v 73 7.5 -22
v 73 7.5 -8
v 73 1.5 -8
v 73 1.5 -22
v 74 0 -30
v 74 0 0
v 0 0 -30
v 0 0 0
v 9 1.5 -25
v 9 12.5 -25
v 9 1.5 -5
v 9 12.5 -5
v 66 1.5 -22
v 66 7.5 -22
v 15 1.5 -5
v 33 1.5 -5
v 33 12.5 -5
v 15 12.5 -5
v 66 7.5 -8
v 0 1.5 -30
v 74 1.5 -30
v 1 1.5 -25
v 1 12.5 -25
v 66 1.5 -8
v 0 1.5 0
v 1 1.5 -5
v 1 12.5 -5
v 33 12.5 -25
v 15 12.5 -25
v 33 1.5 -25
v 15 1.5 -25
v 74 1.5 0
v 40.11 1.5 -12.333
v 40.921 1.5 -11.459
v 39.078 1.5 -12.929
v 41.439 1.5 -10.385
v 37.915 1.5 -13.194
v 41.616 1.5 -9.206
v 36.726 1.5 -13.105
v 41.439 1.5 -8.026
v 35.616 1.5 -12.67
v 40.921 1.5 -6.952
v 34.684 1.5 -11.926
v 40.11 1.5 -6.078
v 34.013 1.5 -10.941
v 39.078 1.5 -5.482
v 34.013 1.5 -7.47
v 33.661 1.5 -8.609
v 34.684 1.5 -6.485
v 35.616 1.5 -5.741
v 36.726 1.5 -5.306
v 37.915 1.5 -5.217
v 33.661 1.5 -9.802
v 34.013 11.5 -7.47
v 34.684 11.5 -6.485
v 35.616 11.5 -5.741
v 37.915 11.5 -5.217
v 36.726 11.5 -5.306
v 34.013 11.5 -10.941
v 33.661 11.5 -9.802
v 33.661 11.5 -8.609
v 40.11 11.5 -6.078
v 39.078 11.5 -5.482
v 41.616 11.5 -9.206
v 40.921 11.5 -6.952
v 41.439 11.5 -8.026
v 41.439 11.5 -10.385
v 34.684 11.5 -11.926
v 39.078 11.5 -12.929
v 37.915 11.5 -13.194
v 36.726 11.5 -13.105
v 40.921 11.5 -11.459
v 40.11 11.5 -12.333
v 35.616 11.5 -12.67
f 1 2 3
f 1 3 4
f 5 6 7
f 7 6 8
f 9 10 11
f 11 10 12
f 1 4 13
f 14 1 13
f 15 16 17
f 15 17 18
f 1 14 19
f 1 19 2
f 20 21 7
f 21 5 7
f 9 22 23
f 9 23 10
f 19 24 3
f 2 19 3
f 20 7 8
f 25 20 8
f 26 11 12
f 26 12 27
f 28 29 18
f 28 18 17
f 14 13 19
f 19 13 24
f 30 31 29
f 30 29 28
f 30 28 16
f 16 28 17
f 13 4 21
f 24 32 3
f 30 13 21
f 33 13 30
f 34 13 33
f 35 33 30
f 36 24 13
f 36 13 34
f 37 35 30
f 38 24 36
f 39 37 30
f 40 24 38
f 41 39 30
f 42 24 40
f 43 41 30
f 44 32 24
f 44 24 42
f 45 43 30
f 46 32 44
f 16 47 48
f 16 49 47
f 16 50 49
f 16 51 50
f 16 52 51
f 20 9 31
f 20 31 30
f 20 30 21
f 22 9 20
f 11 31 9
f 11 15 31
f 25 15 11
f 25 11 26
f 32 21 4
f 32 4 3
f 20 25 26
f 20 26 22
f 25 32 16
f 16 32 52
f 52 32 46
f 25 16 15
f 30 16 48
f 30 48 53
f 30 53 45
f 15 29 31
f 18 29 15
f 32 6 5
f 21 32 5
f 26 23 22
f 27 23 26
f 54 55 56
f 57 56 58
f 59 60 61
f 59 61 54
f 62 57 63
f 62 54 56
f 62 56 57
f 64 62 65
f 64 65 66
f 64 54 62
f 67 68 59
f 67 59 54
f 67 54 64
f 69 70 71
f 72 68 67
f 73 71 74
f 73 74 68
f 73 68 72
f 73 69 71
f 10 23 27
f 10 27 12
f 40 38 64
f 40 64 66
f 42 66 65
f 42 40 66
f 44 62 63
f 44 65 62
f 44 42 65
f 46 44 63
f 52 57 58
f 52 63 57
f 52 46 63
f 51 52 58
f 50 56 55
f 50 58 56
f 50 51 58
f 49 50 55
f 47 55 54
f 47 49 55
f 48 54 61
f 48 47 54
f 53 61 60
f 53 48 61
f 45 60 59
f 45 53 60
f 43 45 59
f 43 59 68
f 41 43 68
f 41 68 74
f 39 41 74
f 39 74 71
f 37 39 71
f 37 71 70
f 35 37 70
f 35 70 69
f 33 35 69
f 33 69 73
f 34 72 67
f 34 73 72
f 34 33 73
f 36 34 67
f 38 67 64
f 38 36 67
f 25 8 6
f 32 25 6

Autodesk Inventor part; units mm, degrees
ref_plane "YZ Plane" through (0, 0, 0) normal (1, 0, 0) x (0, 1, 0)
ref_plane "XZ Plane" through (0, 0, 0) normal (0, 1, 0) x (-1, 0, 0)
ref_plane "XY Plane" through (0, 0, 0) normal (0, 0, 1) x (1, 0, 0)
sketch "Sketch1" plane through (0, 0, 0) normal (0, 1, 0) x (-1, 0, 0)
  line L0 (0, 0) -> (-74, 0)
  line L1 (-74, 0) -> (-74, -30)
  line L2 (-74, -30) -> (0, -30)
  line L3 (0, -30) -> (0, 0)
  dimension "d0" = 74
  dimension "d1" = 30
extrude "Extrusion1" add sketch "Sketch1" along normal blind 1.5
sketch "Sketch2" plane through (0, 1.5, 0) normal (0, 1, 0) x (1, 0, 0)
  line L0 (0, 0) -> (74, 0) construction
  line L1 (0, 0) -> (0, 5) construction
  line L2 (0, 30) -> (0, 0) construction
  line L3 (0, 30) -> (0, 25) construction
  line L4 (0, 25) -> (42, 25)
  line L5 (42, 25) -> (42, 5)
  line L6 (42, 5) -> (0, 5)
  line L7 (0, 5) -> (0, 25)
  dimension "d4" = 5
  dimension "d5" = 5
  dimension "d6" = 42
extrude "Extrusion2" add sketch "Sketch2" along normal blind 11
sketch "Sketch3" plane through (0, 1.5, 0) normal (0, 1, 0) x (1, 0, 0)
  line L0 (74, 30) -> (0, 30) construction
  line L1 (74, 30) -> (74, 22) construction
  line L2 (74, 0) -> (74, 30) construction
  line L3 (0, 0) -> (74, 0) construction
  line L4 (74, 0) -> (74, 8) construction
  line L5 (74, 22) -> (66, 22)
  line L6 (66, 22) -> (66, 8)
  line L7 (66, 8) -> (74, 8)
  line L8 (74, 8) -> (74, 22)
  dimension "d9" = 8
  dimension "d10" = 8
  dimension "d11" = 8
extrude "Extrusion3" add sketch "Sketch3" along normal blind 6
sketch "Sketch4" plane through (0, 12.5, 0) normal (0, 1, 0) x (1, 0, 0)
  line L0 (0, 25) -> (42, 25) projected
  line L1 (42, 5) -> (0, 5) projected
  line L2 (0, 25) -> (9, 25)
  line L3 (9, 25) -> (9, 5)
  line L4 (9, 5) -> (0, 5)
  line L5 (0, 5) -> (0, 25)
  line L6 (0, 25) -> (32, 25)
  line L7 (32, 25) -> (32, 5)
  line L8 (32, 5) -> (0, 5)
  line L9 (0, 5) -> (0, 25)
  line L10 (32, 25) -> (15, 25)
  line L11 (15, 25) -> (15, 5)
  line L12 (15, 5) -> (32, 5)
  line L13 (32, 5) -> (32, 25)
  point P0 (0, 0)
  dimension "d14" = 9
  dimension "d15" = 32
  dimension "d16" = 17
extrude "Extrusion4" cut sketch "Sketch4" against normal up to surface (11 mm away) contours L0 L11 L1 L3
sketch "Sketch5" plane through (0, 12.5, 0) normal (0, 1, 0) x (1, 0, 0)
  line L0 (15, 5) -> (42, 5) projected
  line L1 (15, 25) -> (33, 25)
  line L2 (33, 25) -> (33, 5)
  line L3 (33, 5) -> (15, 5)
  line L4 (15, 5) -> (15, 25)
  line L5 (42, 25) -> (33, 25)
  line L6 (33, 25) -> (33, 5)
  line L7 (33, 5) -> (42, 5)
  line L8 (42, 5) -> (42, 25)
  point P0 (0, 0)
  dimension "d19" = 18
extrude "Extrusion5" cut sketch "Sketch5" against normal up to surface (11 mm away) contours L2 L5 L8 L0
sketch "Sketch6" plane through (0, 1.5, 0) normal (0, 1, 0) x (1, 0, 0)
  line L0 (0, 25) -> (9, 25) construction
  line L1 (0, 25) -> (42, 25) construction
  line L2 (42, 25) -> (42, 5) construction
  line L3 (42, 5) -> (0, 5) construction
  line L4 (0, 5) -> (0, 25) construction
  circle A0 centre (37.6164, 9.2055) radius 4
  point P0 (0, 0)
  dimension "d22" = 42
  dimension "d23" = 20
  dimension "d24" = 8
extrude "Extrusion6" add sketch "Sketch6" along normal blind 10
sketch "Sketch7" plane through (74, 0, 0) normal (1, 0, 0) x (0, 0, -1)
  point P0 (0, 0)
sketch "Sketch8" plane through (0, 0, -30) normal (-1, 0, 0) x (0, 0, 1)
  line L0 (25, 1.5) -> (25, 12.5) projected
  line L1 (25, 1.5) -> (5, 1.5) projected
  line L2 (25, 12.5) -> (5, 12.5)
  line L3 (5, 12.5) -> (5, 1.5)
  line L4 (5, 1.5) -> (25, 1.5)
  line L5 (25, 1.5) -> (25, 12.5)
  point P0 (30, 0)
extrude "Extrusion7" cut sketch "Sketch8" against normal blind 1
sketch "Sketch9" plane through (74, 0, 0) normal (1, 0, 0) x (0, 0, -1)
  line L0 (8, 1.5) -> (8, 7.5) projected
  line L1 (22, 1.5) -> (22, 7.5) projected
  line L2 (8, 7.5) -> (22, 7.5)
  line L3 (22, 7.5) -> (22, 1.5)
  line L4 (22, 1.5) -> (8, 1.5)
  line L5 (8, 1.5) -> (8, 7.5)
  point P0 (0, 0)
extrude "Extrusion8" cut sketch "Sketch9" against normal blind 1
properties part number "PZEM-00ET"
